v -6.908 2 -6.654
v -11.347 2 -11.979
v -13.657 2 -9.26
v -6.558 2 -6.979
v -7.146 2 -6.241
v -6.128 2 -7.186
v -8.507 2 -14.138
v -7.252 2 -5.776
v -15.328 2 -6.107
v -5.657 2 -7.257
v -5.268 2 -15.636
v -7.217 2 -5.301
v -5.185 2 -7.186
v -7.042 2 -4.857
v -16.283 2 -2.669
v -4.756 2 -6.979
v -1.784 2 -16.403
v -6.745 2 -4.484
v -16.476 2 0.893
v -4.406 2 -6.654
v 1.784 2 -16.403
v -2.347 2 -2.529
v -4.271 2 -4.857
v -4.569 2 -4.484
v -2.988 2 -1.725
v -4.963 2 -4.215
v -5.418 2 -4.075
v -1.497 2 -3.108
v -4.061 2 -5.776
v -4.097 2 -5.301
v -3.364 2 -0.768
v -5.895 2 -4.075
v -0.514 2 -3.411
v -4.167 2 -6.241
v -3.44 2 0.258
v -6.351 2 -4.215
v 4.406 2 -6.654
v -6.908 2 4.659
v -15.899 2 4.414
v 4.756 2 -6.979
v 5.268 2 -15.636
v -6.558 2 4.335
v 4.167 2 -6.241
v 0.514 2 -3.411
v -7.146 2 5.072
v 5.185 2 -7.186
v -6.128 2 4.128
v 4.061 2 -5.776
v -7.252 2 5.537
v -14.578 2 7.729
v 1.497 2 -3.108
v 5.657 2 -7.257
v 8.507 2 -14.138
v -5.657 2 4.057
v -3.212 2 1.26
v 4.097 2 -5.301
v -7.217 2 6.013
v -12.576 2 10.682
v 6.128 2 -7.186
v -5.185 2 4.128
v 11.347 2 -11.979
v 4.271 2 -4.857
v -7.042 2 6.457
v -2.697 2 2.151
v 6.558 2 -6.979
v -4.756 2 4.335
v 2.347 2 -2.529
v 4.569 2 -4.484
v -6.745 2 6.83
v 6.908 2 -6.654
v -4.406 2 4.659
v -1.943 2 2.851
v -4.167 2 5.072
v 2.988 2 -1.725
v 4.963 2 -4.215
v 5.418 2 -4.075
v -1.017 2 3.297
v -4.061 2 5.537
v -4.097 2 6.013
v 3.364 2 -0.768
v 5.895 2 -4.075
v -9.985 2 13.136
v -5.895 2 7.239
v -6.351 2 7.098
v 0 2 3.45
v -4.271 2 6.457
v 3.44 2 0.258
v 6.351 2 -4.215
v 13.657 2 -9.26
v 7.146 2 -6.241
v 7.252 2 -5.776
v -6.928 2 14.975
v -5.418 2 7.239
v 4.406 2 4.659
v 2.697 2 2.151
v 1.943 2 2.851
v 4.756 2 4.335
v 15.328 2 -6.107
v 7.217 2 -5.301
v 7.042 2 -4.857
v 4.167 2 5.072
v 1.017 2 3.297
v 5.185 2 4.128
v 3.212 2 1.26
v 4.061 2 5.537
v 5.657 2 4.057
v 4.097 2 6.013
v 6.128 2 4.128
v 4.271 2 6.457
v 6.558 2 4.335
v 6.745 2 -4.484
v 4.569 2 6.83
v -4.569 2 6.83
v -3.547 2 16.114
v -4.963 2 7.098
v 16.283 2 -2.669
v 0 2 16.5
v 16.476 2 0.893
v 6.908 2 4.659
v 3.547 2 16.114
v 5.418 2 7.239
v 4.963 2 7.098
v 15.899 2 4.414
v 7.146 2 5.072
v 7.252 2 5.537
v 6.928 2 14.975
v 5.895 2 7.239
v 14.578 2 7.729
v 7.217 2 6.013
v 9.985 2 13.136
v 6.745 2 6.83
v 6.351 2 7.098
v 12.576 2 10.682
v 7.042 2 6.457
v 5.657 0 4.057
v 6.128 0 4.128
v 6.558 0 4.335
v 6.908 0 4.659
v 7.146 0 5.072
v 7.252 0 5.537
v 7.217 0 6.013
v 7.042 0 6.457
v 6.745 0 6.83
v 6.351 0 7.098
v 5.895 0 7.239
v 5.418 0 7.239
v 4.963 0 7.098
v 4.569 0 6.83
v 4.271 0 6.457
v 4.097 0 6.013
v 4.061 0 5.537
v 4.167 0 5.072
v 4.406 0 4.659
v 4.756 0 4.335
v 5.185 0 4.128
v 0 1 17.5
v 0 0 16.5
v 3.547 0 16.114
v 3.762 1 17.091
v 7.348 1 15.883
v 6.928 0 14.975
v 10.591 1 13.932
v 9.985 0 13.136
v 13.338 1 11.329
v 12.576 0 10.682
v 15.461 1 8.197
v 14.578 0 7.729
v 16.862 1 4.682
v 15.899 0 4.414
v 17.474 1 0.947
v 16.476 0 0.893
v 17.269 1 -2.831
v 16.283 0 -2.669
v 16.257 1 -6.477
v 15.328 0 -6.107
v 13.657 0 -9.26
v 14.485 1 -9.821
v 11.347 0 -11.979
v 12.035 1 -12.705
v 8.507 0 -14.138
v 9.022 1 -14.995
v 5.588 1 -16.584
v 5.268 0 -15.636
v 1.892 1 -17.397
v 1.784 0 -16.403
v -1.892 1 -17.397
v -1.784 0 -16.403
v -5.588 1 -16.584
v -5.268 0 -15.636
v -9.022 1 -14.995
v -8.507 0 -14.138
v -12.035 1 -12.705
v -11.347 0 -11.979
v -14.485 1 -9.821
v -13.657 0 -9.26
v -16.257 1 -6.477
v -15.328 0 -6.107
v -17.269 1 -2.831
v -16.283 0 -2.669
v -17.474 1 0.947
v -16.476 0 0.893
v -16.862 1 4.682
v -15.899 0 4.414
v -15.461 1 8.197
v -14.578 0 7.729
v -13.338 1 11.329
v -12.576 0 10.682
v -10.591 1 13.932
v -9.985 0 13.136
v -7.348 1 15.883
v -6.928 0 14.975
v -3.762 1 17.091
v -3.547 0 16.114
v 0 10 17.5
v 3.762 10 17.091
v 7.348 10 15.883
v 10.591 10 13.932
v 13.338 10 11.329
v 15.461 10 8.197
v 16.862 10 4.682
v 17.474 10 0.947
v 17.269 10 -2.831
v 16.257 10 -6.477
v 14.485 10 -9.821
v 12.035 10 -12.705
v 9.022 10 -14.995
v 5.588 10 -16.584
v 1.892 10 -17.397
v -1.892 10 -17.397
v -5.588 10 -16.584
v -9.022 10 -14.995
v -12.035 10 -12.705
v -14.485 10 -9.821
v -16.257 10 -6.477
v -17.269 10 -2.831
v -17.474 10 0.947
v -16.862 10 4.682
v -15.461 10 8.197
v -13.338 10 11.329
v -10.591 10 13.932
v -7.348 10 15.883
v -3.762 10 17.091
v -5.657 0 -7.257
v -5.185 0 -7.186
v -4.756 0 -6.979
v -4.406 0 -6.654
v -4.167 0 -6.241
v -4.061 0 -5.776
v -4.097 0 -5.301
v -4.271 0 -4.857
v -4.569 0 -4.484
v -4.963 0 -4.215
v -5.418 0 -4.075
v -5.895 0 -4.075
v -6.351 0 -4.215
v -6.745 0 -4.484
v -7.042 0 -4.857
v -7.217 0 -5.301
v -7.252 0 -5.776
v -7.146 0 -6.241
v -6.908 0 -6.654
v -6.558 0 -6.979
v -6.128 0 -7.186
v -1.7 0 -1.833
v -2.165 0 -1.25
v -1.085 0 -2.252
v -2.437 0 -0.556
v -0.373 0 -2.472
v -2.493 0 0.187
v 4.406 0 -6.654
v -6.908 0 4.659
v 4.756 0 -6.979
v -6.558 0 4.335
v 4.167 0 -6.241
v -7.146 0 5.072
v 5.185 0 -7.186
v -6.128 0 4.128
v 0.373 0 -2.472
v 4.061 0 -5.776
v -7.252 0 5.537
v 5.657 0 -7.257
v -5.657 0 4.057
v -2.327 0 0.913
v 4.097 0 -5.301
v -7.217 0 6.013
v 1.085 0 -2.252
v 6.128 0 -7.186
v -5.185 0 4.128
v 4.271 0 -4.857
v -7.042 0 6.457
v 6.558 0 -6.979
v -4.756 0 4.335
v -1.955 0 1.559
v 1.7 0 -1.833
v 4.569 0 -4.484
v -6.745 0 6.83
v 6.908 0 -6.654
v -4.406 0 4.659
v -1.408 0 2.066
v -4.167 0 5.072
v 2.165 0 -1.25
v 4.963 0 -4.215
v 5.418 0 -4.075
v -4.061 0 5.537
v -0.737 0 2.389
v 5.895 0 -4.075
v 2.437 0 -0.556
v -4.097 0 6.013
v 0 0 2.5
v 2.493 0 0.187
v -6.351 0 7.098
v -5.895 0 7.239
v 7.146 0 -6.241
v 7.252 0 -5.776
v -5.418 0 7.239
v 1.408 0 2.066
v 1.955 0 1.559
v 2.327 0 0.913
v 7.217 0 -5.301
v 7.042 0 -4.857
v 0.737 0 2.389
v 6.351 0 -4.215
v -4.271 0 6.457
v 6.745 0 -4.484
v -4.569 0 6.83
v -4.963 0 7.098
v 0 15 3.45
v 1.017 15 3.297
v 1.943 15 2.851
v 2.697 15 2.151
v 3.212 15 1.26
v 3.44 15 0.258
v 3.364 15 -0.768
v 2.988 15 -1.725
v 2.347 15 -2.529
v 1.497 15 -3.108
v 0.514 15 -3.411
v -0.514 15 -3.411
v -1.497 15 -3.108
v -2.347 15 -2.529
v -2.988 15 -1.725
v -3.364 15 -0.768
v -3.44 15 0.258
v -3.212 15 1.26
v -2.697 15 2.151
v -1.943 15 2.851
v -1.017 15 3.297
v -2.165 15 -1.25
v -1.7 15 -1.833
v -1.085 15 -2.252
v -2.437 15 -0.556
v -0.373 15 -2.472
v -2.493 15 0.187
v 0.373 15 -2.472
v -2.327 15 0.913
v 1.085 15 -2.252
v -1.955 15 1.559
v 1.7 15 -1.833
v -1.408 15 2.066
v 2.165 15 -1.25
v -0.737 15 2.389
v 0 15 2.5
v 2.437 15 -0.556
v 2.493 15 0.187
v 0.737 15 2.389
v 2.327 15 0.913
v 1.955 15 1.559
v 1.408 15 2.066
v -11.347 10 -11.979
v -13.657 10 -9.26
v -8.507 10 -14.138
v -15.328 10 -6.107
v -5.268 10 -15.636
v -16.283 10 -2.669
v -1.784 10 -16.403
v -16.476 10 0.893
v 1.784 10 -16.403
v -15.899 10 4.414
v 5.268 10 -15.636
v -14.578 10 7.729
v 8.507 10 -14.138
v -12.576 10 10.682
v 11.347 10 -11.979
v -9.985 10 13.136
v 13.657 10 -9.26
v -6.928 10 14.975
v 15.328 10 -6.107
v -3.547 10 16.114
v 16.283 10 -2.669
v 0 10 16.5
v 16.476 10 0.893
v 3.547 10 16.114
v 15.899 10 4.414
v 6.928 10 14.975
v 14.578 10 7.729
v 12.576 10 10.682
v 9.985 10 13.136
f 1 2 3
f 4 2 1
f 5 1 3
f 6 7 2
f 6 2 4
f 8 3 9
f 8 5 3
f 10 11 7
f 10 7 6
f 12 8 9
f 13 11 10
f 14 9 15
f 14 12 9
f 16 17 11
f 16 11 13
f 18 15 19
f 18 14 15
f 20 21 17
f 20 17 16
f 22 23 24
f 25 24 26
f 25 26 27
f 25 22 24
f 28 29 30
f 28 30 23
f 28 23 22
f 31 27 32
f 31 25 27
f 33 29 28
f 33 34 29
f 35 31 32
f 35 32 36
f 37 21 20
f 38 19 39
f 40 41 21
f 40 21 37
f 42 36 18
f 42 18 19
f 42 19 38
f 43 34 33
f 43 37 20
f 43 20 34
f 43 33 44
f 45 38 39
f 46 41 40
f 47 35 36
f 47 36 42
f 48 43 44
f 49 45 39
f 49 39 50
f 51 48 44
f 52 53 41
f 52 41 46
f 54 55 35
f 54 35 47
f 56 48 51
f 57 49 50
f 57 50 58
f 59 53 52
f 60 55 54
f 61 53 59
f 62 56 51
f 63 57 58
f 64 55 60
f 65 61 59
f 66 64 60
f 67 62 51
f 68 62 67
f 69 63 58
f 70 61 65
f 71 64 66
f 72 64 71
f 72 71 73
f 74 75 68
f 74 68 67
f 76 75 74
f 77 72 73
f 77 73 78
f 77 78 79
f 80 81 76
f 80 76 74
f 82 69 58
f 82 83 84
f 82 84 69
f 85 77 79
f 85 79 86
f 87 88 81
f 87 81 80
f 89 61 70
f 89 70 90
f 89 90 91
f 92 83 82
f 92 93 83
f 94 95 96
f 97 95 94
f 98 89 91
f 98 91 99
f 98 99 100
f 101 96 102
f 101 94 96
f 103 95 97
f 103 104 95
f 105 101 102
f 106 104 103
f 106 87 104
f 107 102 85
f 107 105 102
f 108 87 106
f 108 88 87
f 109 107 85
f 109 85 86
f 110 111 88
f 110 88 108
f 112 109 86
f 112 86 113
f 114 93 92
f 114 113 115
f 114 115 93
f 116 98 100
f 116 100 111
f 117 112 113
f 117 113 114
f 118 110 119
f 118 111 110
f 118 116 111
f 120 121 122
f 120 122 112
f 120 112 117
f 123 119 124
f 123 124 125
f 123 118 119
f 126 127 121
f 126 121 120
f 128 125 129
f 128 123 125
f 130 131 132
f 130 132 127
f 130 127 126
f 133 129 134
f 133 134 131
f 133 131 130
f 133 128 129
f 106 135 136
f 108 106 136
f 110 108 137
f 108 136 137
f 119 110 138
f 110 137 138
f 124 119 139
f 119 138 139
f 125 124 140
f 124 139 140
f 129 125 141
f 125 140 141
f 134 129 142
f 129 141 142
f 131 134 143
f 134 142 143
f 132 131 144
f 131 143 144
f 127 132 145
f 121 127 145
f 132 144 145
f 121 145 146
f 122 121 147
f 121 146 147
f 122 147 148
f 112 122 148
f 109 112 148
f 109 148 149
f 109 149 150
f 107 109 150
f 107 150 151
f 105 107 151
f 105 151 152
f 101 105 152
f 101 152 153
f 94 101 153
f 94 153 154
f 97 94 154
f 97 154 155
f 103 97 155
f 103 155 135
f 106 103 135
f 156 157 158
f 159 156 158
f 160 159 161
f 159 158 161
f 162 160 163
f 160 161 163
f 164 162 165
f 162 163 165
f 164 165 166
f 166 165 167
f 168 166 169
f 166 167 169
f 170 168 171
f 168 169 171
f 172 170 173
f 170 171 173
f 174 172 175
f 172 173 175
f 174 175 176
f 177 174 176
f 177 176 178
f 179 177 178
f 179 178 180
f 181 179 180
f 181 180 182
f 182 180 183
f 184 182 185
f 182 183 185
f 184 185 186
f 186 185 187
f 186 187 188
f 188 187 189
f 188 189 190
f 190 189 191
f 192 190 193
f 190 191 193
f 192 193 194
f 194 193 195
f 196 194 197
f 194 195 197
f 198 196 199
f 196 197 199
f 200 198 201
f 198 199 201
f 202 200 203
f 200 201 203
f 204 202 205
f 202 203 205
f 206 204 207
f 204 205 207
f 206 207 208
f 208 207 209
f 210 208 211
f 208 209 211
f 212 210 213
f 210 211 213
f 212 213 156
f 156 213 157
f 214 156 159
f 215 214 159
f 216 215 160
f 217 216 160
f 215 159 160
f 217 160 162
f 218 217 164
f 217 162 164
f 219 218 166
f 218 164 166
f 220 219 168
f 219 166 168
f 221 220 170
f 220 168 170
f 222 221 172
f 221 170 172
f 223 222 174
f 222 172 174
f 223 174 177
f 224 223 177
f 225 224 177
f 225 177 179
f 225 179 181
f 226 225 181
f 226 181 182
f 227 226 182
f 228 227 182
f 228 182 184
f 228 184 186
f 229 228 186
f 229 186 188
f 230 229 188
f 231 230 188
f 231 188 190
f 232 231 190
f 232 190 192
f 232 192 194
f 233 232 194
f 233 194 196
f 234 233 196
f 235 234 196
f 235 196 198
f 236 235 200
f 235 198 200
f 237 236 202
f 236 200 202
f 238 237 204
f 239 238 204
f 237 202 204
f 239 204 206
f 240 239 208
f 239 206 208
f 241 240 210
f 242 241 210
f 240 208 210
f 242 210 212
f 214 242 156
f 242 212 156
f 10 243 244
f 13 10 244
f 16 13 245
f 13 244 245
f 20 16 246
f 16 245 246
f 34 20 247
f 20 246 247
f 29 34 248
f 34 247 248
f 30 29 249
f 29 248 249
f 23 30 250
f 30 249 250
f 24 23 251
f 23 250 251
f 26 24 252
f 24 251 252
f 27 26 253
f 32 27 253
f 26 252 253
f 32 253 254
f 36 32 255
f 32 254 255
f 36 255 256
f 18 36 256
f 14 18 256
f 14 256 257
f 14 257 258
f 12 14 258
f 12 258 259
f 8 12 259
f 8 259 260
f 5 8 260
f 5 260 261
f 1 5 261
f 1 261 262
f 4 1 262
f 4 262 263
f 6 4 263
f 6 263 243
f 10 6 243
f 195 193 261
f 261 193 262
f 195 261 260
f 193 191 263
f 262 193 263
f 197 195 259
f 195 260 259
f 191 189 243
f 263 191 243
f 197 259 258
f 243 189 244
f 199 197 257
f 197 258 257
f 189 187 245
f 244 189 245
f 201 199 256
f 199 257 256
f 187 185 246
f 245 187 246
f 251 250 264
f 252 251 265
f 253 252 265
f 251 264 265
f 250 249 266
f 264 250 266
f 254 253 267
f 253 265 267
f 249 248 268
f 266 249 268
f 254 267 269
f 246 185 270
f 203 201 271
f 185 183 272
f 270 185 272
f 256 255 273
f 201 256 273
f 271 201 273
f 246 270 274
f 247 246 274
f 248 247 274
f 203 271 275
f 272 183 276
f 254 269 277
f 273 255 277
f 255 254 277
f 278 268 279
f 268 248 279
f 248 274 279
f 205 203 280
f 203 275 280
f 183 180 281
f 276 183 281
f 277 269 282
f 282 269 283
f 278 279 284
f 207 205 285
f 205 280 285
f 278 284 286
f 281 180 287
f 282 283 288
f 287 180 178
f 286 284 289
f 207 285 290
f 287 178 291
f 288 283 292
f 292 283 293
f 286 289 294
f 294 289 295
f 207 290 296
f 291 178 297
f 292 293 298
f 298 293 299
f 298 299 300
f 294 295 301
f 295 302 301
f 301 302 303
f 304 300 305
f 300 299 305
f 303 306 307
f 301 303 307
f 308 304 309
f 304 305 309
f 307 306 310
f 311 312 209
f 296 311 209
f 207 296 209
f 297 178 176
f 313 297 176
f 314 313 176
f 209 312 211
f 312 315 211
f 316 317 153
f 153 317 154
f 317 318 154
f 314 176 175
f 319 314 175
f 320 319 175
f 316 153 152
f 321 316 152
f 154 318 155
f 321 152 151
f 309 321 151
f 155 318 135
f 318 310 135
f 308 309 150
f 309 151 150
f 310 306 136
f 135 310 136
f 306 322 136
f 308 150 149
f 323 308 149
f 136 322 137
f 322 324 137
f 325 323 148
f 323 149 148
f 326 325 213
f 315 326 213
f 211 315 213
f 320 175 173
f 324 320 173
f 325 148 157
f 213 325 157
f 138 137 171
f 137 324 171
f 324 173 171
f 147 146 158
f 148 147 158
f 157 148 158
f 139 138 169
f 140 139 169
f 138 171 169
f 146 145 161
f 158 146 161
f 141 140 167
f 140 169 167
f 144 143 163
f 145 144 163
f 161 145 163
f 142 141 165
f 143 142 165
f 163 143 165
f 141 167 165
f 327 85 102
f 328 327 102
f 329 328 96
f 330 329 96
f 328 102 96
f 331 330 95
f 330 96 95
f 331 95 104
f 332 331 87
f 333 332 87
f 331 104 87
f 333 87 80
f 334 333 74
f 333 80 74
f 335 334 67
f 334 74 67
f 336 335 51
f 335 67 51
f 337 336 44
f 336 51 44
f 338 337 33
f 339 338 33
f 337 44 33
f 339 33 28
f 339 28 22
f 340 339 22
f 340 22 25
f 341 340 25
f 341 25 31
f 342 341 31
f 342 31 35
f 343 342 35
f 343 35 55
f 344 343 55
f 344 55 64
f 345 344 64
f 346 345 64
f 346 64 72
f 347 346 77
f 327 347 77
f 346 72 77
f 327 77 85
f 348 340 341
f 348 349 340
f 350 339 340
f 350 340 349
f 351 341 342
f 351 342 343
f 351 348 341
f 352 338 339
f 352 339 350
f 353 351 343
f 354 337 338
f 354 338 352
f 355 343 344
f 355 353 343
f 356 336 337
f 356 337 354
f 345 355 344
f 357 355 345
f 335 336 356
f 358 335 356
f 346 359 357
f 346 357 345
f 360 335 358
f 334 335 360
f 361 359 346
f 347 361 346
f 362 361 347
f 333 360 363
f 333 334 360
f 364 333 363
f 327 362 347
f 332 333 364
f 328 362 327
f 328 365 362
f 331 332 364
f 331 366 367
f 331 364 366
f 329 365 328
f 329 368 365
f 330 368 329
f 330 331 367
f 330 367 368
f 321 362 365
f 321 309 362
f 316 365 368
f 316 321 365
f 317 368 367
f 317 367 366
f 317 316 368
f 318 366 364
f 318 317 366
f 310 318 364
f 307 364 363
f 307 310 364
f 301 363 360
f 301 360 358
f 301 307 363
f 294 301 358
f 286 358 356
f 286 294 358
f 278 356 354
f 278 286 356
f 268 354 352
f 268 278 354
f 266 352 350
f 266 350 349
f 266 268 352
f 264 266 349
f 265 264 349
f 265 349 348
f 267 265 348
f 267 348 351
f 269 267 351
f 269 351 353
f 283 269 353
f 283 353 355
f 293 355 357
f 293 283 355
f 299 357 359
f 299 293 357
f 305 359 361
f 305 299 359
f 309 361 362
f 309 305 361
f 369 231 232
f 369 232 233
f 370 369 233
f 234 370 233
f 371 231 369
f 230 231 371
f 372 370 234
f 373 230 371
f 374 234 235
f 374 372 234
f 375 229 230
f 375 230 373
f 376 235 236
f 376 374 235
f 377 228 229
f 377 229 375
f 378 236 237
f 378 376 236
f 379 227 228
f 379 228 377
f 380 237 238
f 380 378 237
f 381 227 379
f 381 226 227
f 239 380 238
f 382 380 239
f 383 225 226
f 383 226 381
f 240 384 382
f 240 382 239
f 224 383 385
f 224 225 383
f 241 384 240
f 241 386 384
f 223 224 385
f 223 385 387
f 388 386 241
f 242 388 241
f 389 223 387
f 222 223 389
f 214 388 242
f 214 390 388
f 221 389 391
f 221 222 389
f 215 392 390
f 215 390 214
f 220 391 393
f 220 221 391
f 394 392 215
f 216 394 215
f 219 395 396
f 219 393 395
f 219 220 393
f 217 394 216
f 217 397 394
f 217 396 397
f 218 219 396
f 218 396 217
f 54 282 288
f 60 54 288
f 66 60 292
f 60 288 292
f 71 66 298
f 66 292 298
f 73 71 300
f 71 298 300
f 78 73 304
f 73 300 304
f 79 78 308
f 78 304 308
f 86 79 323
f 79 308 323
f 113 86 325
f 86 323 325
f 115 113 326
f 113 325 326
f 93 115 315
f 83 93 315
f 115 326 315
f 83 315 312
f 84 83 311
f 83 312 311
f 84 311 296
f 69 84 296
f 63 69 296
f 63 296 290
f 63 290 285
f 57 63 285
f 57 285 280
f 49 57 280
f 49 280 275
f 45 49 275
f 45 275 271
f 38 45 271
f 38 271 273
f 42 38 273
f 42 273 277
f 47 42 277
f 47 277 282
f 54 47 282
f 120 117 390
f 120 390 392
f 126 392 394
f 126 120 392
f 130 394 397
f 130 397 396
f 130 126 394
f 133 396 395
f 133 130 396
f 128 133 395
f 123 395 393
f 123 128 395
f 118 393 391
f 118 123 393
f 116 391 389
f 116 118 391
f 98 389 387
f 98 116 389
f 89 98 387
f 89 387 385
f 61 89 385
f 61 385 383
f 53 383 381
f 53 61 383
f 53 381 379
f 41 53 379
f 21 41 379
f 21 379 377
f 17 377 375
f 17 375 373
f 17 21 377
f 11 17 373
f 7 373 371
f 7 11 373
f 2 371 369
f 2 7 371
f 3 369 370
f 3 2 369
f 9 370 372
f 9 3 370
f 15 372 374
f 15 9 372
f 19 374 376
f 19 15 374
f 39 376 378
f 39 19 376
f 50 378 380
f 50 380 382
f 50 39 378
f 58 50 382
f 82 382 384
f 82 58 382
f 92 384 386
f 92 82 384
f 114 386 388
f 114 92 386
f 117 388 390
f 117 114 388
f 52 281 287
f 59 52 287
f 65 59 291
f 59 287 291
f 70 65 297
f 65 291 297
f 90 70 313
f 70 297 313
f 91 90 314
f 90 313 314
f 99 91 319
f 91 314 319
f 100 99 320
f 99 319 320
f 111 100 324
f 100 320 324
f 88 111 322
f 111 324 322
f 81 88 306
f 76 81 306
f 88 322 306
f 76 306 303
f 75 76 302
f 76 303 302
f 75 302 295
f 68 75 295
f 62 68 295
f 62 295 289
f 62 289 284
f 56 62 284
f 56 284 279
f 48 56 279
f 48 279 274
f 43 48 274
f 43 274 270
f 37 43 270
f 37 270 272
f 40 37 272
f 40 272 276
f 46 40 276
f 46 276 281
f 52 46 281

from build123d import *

# Parameters (mm, degrees)
SKETCH1_R          = 17.5
SKETCH1_R_2        = 2.5
BODY_DEPTH         = 2
SKETCH4_R          = 3.45
SKETCH4_R_2        = 2.5
SHAFT_DEPTH        = 13
SKETCH5_R          = 17.5
SKETCH5_R_2        = 16.5
BORDER_DEPTH       = 8
SKETCH3_R          = 1.6
SCREW_HOLES_DEPTH  = 3
SCREW_CHAMFER_SIZE = 1


with BuildPart() as part:
    # Sketch1 → Body (new body)
    with BuildSketch(Plane(origin=(0, 0, 0), x_dir=(1, 0, 0), z_dir=(0, 1, 0))):
        with Locations(Location((0, 0, 0), (0, 0, 270))):
            Circle(SKETCH1_R)
        with Locations(Location((0, 0, 0), (0, 0, 270))):
            Circle(SKETCH1_R_2, mode=Mode.SUBTRACT)
    extrude(amount=BODY_DEPTH)

    # Sketch4 → Shaft (add)
    with BuildSketch(Plane(origin=(0, 2, 0), x_dir=(1, 0, 0), z_dir=(0, 1, 0))):
        with Locations(Location((0, 0, 0), (0, 0, 270))):
            Circle(SKETCH4_R)
        with Locations(Location((0, 0, 0), (0, 0, 270))):
            Circle(SKETCH4_R_2, mode=Mode.SUBTRACT)
    extrude(amount=SHAFT_DEPTH)

    # Sketch5 → Border (add)
    with BuildSketch(Plane(origin=(0, 2, 0), x_dir=(1, 0, 0), z_dir=(0, 1, 0))):
        with Locations(Location((0, 0, 0), (0, 0, 270))):
            Circle(SKETCH5_R)
        with Locations(Location((0, 0, 0), (0, 0, 270))):
            Circle(SKETCH5_R_2, mode=Mode.SUBTRACT)
    extrude(amount=BORDER_DEPTH)

    # Sketch3 → Screw holes (cut)
    with BuildSketch(Plane(origin=(0, 0, 0), x_dir=(-1, 0, 0), z_dir=(0, -1, 0))):
        with Locations(Location((5.656854249, 5.656854249, 0), (0, 0, 90))):
            Circle(SKETCH3_R)
        with Locations(Location((5.656854249, -5.656854249, 0), (0, 0, 90))):
            Circle(SKETCH3_R)
        with Locations(Location((-5.656854249, -5.656854249, 0), (0, 0, 90))):
            Circle(SKETCH3_R)
        with Locations(Location((-5.656854249, 5.656854249, 0), (0, 0, 90))):
            Circle(SKETCH3_R)
    extrude(amount=-SCREW_HOLES_DEPTH, mode=Mode.SUBTRACT)

    # Screw chamfer
    screw_chamfer_edges = [part.edges().sort_by_distance(p)[0] for p in [
        (0, 0, -17.5),
    ]]
    chamfer(screw_chamfer_edges, length=SCREW_CHAMFER_SIZE)


solid = part.part
